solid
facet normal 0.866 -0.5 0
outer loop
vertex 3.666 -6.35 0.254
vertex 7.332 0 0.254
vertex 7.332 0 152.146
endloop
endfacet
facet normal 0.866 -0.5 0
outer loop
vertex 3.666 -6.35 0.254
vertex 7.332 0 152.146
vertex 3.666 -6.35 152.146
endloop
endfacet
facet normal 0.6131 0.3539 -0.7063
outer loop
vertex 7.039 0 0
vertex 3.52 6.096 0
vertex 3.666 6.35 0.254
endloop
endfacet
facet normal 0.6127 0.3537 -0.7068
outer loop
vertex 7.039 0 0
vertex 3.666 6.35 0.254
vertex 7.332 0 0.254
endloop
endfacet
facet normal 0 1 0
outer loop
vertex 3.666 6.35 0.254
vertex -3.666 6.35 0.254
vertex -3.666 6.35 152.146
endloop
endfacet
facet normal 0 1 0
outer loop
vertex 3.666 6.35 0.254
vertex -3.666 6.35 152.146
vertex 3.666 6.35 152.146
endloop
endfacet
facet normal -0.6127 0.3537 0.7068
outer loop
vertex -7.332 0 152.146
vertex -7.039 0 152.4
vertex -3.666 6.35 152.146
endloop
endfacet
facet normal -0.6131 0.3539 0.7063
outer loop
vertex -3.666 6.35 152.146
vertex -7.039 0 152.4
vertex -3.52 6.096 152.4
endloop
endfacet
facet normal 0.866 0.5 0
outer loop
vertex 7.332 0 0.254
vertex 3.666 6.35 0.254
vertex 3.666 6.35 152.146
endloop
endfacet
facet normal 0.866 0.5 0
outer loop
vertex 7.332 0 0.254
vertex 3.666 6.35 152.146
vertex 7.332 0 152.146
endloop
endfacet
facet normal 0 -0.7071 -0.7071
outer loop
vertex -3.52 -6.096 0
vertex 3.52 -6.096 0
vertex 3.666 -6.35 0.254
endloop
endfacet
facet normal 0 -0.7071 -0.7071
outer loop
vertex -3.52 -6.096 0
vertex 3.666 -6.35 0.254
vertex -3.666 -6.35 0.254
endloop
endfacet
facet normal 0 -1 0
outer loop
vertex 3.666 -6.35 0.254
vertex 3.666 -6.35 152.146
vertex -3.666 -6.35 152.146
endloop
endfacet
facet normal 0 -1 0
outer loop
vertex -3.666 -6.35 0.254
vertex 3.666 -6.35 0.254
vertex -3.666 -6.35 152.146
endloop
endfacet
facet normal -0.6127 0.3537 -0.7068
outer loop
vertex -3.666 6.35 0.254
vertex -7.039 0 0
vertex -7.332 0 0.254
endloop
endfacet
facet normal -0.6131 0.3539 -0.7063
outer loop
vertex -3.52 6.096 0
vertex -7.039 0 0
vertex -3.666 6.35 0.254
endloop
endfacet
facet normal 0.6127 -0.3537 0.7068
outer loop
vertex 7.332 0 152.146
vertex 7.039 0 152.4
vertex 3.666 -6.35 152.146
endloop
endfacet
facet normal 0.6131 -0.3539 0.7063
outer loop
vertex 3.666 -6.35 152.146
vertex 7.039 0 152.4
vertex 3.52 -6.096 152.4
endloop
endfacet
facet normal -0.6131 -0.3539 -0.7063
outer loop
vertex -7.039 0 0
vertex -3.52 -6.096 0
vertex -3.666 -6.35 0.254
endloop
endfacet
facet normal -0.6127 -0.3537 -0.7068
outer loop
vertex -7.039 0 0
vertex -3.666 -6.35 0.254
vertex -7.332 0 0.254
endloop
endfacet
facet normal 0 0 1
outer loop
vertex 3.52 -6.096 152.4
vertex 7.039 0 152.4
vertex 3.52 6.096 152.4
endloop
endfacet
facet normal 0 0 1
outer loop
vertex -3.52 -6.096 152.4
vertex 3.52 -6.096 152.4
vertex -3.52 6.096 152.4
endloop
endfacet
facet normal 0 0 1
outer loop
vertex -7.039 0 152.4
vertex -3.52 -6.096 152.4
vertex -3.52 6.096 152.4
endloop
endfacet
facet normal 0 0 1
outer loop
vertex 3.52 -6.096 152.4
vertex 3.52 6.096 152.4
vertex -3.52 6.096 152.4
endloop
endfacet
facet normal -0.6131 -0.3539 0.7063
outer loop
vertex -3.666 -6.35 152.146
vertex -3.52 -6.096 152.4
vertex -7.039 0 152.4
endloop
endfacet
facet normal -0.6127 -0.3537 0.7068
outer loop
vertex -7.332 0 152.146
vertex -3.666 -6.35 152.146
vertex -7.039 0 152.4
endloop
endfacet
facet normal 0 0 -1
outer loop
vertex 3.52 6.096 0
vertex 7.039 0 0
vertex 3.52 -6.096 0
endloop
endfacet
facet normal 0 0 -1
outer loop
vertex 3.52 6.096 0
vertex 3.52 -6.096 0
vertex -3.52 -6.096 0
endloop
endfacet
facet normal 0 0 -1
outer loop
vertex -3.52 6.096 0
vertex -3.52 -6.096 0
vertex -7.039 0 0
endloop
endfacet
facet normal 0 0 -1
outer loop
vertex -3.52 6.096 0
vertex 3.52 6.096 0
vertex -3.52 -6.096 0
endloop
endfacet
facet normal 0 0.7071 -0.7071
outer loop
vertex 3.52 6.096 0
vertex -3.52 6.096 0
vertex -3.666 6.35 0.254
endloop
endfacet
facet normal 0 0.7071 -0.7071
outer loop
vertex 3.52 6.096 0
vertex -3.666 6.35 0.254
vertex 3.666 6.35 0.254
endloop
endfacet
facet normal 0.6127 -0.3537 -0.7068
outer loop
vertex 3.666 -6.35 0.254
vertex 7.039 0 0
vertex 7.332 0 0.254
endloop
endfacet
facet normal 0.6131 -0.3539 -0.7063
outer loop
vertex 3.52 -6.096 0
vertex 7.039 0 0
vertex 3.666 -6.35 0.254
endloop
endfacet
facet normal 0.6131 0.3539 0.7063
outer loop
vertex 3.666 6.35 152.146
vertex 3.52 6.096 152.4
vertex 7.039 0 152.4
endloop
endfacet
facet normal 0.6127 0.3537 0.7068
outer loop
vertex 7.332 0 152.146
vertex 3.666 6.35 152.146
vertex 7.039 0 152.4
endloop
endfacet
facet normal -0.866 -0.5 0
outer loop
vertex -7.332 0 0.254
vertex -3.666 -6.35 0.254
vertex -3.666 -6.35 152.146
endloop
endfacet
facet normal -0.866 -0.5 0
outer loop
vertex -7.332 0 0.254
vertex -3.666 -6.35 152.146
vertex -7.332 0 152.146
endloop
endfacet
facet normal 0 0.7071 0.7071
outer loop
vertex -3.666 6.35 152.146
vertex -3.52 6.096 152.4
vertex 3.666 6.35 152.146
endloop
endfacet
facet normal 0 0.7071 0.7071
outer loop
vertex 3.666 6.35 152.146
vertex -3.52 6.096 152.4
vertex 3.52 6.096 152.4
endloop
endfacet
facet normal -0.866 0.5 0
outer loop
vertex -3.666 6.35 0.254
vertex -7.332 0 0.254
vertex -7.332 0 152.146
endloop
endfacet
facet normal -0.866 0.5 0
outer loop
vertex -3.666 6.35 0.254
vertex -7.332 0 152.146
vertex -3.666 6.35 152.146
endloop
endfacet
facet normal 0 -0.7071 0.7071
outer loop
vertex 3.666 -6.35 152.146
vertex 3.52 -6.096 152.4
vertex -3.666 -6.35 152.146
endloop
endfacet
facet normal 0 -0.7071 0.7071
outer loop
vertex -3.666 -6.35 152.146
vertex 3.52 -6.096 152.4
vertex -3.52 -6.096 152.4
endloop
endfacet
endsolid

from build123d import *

# Parameters (mm, degrees)
BOSS_EXTRUDE1_DEPTH = 152.4
CHAMFER1_SIZE       = 0.254


with BuildPart() as part:
    # Sketch1 → Boss-Extrude1 (new body)
    with BuildSketch(Plane(origin=(0, 0, 0), x_dir=(-1, 0, 0), z_dir=(0, 0, -1))):
        Polygon((3.666174209, 6.35), (-3.666174209, 6.35), (-7.332348419, 0), (-3.666174209, -6.35), (3.666174209, -6.35), (7.332348419, 0), align=None)
    extrude(amount=-BOSS_EXTRUDE1_DEPTH)

    # Chamfer1
    chamfer1_edges = [part.edges().sort_by_distance(p)[0] for p in [
        (5.499261314, 3.175, 152.4),
        (5.499261314, -3.175, 152.4),
        (0, -6.35, 152.4),
        (-5.499261314, -3.175, 152.4),
        (-5.499261314, 3.175, 152.4),
        (-5.499261314, -3.175, 0),
        (0, -6.35, 0),
        (5.499261314, -3.175, 0),
        (5.499261314, 3.175, 0),
        (0, 6.35, 0),
        (-5.499261314, 3.175, 0),
        (0, 6.35, 152.4),
    ]]
    chamfer(chamfer1_edges, length=CHAMFER1_SIZE)


solid = part.part
